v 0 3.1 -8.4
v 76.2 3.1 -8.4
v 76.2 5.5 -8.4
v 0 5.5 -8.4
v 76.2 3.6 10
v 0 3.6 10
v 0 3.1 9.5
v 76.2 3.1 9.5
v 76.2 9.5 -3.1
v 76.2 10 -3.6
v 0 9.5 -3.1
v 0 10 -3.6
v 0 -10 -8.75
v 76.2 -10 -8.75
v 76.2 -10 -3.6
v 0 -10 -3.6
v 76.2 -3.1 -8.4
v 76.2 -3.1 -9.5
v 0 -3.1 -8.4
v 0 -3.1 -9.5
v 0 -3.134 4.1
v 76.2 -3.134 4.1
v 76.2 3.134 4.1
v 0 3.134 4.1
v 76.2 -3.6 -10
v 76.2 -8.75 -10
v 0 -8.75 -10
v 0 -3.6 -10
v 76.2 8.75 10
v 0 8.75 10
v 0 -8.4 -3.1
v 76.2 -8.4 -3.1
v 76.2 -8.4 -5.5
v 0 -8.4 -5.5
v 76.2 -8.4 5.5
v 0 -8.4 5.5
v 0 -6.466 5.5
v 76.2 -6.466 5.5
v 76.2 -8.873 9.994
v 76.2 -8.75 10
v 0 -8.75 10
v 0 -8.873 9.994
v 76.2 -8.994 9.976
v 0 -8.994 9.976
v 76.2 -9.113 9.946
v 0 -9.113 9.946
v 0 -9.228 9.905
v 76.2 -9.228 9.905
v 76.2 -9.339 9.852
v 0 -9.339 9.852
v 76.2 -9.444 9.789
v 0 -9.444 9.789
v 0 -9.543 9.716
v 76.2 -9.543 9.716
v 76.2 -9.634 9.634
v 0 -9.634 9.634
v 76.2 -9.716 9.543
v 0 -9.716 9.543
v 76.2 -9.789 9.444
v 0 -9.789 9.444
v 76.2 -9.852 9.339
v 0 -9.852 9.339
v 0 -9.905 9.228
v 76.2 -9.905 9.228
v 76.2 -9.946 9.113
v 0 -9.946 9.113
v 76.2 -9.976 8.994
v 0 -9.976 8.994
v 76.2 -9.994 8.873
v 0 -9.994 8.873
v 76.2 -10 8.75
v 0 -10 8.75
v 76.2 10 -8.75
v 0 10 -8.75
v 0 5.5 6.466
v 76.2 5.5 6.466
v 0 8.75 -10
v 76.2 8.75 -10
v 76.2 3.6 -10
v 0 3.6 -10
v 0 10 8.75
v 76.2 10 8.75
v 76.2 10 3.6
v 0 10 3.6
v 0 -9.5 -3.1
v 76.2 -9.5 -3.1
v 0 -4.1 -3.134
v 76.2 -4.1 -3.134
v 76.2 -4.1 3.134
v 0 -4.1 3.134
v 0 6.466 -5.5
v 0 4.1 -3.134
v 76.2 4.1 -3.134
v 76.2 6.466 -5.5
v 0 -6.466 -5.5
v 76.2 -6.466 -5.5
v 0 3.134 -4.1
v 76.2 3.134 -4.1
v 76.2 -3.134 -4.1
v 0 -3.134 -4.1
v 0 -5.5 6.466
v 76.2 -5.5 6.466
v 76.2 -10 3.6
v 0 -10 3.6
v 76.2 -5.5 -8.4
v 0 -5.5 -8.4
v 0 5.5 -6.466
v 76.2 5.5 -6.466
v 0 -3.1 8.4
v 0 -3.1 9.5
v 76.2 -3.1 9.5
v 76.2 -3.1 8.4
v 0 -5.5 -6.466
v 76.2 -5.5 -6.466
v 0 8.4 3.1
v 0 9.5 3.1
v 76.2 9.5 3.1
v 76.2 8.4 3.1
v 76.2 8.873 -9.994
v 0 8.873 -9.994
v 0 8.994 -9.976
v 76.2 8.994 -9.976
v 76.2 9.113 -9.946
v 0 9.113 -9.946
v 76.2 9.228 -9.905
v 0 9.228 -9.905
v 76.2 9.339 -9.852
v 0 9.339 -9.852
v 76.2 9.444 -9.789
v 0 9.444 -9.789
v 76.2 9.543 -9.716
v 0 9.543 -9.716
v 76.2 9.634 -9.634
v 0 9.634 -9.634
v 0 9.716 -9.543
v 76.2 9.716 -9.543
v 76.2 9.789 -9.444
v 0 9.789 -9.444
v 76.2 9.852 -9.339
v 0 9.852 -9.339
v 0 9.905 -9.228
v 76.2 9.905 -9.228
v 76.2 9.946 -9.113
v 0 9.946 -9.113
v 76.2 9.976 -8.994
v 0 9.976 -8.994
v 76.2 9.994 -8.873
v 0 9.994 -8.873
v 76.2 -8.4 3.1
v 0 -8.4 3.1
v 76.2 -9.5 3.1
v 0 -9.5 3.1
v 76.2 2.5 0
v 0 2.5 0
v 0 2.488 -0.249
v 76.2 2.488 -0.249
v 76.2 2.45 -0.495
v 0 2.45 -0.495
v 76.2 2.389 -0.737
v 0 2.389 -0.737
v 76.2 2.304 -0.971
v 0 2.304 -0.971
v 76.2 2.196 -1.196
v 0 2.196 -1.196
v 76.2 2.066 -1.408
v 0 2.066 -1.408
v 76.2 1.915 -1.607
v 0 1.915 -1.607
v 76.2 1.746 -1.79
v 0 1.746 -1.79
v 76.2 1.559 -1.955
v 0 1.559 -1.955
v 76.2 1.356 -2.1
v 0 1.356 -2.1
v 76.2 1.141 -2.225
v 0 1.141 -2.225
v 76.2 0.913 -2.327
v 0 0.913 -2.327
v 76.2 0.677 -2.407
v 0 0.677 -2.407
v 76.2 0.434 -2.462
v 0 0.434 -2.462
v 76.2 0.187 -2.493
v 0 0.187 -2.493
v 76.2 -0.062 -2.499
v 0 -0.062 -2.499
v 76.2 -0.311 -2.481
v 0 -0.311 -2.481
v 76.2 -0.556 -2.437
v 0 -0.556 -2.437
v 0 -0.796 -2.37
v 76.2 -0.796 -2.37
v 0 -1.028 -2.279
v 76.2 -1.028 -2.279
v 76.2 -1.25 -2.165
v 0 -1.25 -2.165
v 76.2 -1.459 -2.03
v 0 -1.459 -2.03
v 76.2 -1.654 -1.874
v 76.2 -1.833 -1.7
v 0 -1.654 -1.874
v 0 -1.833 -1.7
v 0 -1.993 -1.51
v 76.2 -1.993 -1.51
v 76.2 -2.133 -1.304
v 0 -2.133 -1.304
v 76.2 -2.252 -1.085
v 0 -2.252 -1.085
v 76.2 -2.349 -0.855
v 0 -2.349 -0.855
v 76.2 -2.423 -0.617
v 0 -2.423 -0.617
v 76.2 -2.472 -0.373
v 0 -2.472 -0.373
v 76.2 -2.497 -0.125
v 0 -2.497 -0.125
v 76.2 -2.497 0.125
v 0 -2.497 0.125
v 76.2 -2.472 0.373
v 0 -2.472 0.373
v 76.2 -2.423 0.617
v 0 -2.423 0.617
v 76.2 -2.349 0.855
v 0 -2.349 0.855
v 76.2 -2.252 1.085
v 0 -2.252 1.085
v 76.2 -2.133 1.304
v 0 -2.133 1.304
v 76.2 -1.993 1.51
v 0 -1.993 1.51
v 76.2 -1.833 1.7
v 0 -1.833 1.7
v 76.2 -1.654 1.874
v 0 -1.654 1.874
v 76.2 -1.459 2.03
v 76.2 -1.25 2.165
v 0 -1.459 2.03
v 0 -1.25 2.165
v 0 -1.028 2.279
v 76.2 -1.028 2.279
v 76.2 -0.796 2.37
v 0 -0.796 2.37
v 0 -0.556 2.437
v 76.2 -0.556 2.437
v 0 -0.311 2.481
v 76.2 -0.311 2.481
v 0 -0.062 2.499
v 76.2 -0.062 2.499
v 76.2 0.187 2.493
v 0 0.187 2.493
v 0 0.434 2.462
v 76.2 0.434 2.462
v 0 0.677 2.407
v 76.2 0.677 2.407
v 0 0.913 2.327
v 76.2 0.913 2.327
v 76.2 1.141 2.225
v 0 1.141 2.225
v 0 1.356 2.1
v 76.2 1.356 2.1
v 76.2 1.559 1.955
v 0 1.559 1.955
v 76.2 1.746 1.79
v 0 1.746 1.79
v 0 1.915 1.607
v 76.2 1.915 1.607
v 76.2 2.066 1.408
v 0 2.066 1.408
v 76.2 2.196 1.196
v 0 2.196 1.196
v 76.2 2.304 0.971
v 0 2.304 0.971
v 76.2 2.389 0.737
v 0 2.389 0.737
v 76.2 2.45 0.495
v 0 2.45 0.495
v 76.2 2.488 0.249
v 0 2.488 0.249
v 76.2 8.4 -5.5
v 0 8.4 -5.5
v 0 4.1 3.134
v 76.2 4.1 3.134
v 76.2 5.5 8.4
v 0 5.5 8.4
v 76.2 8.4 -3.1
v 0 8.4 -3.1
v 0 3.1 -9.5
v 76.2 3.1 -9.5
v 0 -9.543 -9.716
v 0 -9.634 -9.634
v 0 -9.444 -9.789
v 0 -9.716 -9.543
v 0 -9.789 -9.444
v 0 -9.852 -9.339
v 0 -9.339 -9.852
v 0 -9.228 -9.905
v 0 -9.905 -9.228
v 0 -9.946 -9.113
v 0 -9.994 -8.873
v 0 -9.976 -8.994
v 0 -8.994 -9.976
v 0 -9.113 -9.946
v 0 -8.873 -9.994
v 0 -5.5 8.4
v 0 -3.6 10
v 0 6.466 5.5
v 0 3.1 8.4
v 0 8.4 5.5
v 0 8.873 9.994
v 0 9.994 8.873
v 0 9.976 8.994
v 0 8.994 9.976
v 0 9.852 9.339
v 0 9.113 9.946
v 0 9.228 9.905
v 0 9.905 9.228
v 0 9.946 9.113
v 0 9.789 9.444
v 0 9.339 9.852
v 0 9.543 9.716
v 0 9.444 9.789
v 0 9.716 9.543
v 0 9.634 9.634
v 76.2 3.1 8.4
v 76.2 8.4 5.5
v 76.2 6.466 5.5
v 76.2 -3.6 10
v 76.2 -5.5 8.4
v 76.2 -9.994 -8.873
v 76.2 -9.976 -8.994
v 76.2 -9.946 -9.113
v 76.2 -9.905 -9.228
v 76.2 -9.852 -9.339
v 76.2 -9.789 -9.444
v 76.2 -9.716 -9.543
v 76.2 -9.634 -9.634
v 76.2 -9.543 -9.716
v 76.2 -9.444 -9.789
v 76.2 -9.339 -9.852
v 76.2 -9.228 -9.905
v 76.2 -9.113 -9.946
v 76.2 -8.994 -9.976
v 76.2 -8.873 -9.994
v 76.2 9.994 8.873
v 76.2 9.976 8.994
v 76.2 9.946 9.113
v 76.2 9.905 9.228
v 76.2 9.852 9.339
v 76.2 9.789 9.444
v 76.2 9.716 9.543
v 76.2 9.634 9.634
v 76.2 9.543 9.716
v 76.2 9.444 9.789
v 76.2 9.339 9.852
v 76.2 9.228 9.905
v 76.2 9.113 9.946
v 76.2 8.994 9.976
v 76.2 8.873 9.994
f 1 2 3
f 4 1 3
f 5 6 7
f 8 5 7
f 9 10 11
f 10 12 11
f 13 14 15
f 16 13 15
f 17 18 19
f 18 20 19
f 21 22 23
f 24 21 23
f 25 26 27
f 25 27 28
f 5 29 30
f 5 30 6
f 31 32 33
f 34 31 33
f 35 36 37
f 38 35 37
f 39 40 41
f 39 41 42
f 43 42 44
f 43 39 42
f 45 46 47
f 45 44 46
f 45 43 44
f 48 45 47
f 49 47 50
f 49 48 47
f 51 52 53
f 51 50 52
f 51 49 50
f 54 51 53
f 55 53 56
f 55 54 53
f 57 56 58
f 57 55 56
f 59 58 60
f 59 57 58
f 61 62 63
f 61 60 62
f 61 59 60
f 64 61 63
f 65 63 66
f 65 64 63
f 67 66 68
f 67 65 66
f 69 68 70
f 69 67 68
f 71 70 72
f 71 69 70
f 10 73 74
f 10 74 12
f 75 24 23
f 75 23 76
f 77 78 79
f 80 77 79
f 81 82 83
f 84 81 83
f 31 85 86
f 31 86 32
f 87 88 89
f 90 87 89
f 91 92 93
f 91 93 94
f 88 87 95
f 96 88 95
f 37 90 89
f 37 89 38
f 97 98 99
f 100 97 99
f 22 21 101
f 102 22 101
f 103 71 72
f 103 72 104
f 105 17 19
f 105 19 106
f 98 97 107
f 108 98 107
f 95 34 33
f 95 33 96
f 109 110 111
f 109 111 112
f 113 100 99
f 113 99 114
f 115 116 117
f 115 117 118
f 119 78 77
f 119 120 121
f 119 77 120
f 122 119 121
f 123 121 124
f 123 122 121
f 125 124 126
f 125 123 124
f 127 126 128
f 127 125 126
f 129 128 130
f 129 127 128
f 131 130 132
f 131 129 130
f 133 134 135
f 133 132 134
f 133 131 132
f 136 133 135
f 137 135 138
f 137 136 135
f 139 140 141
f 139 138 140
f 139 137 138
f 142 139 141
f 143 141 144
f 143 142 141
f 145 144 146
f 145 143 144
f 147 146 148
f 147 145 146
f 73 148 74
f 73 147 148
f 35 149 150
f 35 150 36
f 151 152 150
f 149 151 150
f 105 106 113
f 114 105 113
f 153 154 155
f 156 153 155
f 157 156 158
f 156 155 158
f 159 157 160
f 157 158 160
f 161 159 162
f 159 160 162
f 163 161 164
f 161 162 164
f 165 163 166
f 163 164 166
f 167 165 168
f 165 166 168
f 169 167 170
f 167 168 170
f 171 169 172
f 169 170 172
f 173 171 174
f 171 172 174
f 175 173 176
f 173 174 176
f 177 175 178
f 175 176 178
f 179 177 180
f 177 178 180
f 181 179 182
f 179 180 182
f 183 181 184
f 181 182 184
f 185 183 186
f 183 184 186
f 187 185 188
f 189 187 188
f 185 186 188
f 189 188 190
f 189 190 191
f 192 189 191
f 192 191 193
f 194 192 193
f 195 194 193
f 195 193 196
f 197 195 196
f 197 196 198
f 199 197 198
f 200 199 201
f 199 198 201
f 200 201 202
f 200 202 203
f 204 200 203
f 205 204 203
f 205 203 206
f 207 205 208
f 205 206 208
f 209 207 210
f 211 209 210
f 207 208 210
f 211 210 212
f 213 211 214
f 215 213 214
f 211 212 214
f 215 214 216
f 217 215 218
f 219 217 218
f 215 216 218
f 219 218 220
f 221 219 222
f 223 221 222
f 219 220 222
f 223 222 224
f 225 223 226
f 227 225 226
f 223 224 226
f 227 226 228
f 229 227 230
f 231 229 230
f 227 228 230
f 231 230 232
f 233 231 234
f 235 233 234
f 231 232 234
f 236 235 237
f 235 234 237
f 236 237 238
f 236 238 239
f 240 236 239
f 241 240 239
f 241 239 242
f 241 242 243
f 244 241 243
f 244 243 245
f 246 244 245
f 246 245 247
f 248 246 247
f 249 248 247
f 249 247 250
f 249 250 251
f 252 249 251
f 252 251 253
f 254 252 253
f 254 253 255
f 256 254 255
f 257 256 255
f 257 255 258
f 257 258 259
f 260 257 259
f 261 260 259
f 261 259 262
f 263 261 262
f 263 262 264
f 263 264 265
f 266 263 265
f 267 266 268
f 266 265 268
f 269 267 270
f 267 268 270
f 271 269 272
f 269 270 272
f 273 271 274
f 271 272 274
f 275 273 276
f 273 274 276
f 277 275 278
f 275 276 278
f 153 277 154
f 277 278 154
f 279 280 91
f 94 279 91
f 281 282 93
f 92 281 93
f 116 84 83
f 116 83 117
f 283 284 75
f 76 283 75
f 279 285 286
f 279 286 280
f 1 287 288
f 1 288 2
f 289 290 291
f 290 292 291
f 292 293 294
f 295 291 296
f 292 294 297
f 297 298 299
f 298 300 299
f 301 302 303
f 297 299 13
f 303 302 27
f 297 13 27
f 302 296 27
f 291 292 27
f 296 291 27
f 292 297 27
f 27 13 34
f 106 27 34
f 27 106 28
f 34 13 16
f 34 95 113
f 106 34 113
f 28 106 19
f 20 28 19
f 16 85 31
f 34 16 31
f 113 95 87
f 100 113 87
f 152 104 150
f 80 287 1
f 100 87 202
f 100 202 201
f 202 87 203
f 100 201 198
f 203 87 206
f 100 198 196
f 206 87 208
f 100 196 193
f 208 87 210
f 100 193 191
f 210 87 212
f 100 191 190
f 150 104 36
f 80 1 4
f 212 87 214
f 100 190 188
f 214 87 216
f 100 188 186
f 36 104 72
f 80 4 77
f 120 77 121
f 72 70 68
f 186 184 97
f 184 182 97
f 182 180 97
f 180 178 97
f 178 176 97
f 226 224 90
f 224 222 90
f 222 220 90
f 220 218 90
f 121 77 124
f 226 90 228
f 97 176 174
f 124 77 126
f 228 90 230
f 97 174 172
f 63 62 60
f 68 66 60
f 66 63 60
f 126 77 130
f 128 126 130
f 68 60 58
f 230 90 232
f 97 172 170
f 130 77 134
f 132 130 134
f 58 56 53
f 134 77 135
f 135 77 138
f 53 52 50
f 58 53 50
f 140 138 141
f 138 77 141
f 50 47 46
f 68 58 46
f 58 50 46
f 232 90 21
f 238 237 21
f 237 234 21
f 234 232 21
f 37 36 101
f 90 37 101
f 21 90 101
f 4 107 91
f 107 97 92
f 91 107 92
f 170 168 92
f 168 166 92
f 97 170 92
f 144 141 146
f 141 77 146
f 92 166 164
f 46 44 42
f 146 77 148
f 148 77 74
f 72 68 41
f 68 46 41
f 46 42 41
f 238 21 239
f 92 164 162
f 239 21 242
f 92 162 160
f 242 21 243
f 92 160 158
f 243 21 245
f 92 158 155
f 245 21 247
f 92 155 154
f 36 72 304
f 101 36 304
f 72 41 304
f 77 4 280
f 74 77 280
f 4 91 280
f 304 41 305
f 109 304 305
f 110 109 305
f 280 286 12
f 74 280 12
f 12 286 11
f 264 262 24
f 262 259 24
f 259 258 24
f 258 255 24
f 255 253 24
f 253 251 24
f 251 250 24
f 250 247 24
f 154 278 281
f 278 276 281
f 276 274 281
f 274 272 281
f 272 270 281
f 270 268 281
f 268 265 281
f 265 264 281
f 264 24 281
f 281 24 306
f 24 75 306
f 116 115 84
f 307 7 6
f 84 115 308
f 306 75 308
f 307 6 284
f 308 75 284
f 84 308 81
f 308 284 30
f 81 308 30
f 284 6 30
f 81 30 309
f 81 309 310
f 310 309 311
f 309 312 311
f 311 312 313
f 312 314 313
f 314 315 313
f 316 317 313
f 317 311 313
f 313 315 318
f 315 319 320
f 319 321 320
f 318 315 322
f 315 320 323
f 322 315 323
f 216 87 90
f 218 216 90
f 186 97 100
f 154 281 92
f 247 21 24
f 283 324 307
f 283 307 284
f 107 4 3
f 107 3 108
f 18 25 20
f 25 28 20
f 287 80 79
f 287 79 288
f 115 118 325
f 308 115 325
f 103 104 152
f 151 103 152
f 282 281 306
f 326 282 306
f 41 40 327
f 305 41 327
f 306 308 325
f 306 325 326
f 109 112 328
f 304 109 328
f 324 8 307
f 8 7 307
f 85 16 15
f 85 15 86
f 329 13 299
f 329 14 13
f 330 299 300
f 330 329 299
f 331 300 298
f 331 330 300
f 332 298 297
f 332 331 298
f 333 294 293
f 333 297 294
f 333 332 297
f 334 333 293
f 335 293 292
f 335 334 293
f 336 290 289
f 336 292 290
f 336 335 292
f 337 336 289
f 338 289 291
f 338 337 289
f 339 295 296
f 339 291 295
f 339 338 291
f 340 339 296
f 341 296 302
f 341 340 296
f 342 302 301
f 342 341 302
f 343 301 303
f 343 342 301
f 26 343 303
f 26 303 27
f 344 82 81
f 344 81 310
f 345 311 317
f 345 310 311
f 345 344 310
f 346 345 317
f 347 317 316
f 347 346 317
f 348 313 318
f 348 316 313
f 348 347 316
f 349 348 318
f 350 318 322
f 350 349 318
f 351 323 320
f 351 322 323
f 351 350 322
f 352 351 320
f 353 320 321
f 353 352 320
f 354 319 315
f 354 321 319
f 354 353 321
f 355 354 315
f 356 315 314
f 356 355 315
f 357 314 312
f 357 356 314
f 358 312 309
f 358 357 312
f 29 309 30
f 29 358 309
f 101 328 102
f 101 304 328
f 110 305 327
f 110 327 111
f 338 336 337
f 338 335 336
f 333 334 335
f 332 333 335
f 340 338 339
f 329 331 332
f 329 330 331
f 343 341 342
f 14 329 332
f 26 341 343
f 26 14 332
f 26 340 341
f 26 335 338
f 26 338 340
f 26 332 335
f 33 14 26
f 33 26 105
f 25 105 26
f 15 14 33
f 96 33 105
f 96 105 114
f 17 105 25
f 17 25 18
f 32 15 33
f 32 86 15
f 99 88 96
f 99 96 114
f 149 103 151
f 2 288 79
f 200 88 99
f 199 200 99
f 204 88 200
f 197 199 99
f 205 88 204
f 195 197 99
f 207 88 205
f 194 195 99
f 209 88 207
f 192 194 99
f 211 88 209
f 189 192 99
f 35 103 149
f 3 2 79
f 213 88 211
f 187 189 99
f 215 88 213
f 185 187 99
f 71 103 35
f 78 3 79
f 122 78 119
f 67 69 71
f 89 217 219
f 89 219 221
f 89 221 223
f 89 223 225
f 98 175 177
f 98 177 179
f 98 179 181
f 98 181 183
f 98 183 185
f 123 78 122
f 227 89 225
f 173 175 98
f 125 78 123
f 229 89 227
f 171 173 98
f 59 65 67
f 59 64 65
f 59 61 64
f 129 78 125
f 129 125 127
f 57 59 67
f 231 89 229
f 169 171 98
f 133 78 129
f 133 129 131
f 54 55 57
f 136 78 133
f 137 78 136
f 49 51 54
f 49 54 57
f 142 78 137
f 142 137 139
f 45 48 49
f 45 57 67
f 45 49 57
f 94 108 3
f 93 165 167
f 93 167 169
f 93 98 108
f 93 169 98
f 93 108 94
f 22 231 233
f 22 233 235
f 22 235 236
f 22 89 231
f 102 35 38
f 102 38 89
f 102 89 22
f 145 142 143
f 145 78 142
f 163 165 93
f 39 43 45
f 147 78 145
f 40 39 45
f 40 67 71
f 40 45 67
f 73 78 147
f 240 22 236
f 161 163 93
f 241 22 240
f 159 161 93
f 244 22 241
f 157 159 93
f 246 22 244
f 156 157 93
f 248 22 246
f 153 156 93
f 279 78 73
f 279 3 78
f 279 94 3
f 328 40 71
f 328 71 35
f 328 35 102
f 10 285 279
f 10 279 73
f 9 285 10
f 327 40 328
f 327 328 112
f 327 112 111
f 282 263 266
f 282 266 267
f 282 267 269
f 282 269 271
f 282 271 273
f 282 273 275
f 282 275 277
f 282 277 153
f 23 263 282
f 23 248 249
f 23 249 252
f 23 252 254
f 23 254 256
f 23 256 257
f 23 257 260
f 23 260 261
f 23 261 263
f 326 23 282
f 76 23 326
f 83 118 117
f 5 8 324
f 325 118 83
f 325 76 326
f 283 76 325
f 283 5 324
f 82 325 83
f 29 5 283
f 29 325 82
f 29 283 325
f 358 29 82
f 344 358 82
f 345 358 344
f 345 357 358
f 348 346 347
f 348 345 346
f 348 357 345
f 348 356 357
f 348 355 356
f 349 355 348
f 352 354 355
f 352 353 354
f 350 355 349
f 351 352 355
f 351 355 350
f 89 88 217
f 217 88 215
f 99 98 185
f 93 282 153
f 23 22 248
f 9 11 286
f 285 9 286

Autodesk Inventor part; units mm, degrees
ref_plane "YZ Plane" through (0, 0, 0) normal (1, 0, 0) x (0, 1, 0)
ref_plane "XZ Plane" through (0, 0, 0) normal (0, 1, 0) x (-1, 0, 0)
ref_plane "XY Plane" through (0, 0, 0) normal (0, 0, 1) x (1, 0, 0)
sketch "Sketch1" plane through (0, 0, 0) normal (1, 0, 0) x (0, 1, 0)
  circle A0 centre (0, 0) radius 2.5
  line L0 (0, 0) -> (10, 0)
  line L1 (10, -10) -> (10, -3.6)
  line L2 (10, -3.6) -> (9.5, -3.1)
  line L3 (9.5, -3.1) -> (8.4, -3.1)
  line L4 (8.4, -3.1) -> (8.4, -5.5)
  line L5 (-3.134, 4.1) -> (3.134, 4.1)
  line L6 (4.1, 3.134) -> (4.1, -3.134)
  line L7 (3.134, -4.1) -> (-3.134, -4.1)
  line L8 (-4.1, -3.134) -> (-4.1, 3.134)
  line L9 (-4.1, 4.1) -> (4.1, -4.1) construction
  line L10 (4.1, 4.1) -> (-4.1, -4.1) construction
  line L11 (4.1, -3.134) -> (6.466, -5.5)
  line L12 (8.4, -5.5) -> (6.466, -5.5)
  line L13 (10, -10) -> (3.6, -10)
  line L14 (3.6, -10) -> (3.1, -9.5)
  line L15 (3.1, -9.5) -> (3.1, -8.4)
  line L16 (3.1, -8.4) -> (5.5, -8.4)
  line L17 (3.134, -4.1) -> (5.5, -6.466)
  line L18 (5.5, -8.4) -> (5.5, -6.466)
  line L19 (10, 10) -> (10, 3.6)
  line L20 (10, 3.6) -> (9.5, 3.1)
  line L21 (9.5, 3.1) -> (8.4, 3.1)
  line L22 (8.4, 3.1) -> (8.4, 5.5)
  line L23 (4.1, 3.134) -> (6.466, 5.5)
  line L24 (8.4, 5.5) -> (6.466, 5.5)
  line L25 (5.5, 8.4) -> (5.5, 6.466)
  line L26 (3.134, 4.1) -> (5.5, 6.466)
  line L27 (3.1, 8.4) -> (5.5, 8.4)
  line L28 (3.1, 9.5) -> (3.1, 8.4)
  line L29 (3.6, 10) -> (3.1, 9.5)
  line L30 (10, 10) -> (3.6, 10)
  line L31 (0, 0) -> (0, -5.5)
  line L32 (-10, -10) -> (-10, -3.6)
  line L33 (-10, -3.6) -> (-9.5, -3.1)
  line L34 (-9.5, -3.1) -> (-8.4, -3.1)
  line L35 (-8.4, -3.1) -> (-8.4, -5.5)
  line L36 (-4.1, -3.134) -> (-6.466, -5.5)
  line L37 (-8.4, -5.5) -> (-6.466, -5.5)
  line L38 (-5.5, -8.4) -> (-5.5, -6.466)
  line L39 (-3.134, -4.1) -> (-5.5, -6.466)
  line L40 (-3.1, -8.4) -> (-5.5, -8.4)
  line L41 (-3.1, -9.5) -> (-3.1, -8.4)
  line L42 (-3.6, -10) -> (-3.1, -9.5)
  line L43 (-10, -10) -> (-3.6, -10)
  line L44 (-4.1, 3.134) -> (-6.466, 5.5)
  line L45 (-3.134, 4.1) -> (-5.5, 6.466)
  line L46 (-8.4, 3.1) -> (-8.4, 5.5)
  line L47 (-8.4, 5.5) -> (-6.466, 5.5)
  line L48 (-5.5, 8.4) -> (-5.5, 6.466)
  line L49 (-3.1, 8.4) -> (-5.5, 8.4)
  line L50 (-9.5, 3.1) -> (-8.4, 3.1)
  line L51 (-10, 3.6) -> (-9.5, 3.1)
  line L52 (-3.1, 9.5) -> (-3.1, 8.4)
  line L53 (-3.6, 10) -> (-3.1, 9.5)
  line L54 (-10, 10) -> (-3.6, 10)
  line L55 (-10, 10) -> (-10, 3.6)
  point P0 (-10, 0)
  dimension "d0" = 5
  dimension "d3" = 3.6
  dimension "d4" = 45
  dimension "d5" = 3.1
  dimension "d7" = 5.5
  dimension "d8" = 1.6
  dimension "d11" = 4.3
extrude "Extrusion1" add sketch "Sketch1" along normal blind 76.2 contours L0 L6 L11 L12 L4 L3 L2 L1 L13 L14 L15 L16 L18 L17 L7 L31 A0 | A0 L31 L7 L39 L38 L40 L41 L42 L43 L32 L33 L34 L35 L37 L36 L8 L44 L47 L46 L50 L51 L55 L54 L53 L52 L49 L48 L45 L5 L26 L25 L27 L28 L29 L30 L19 L20 L21 L22 L24 L23 L6 L0
fillet "Fillet1" radius 1.25 4 edges at (38.1, 10, 10) (38.1, -10, 10) (38.1, 10, -10) (38.1, -10, -10)
properties part number "2020-3in"
